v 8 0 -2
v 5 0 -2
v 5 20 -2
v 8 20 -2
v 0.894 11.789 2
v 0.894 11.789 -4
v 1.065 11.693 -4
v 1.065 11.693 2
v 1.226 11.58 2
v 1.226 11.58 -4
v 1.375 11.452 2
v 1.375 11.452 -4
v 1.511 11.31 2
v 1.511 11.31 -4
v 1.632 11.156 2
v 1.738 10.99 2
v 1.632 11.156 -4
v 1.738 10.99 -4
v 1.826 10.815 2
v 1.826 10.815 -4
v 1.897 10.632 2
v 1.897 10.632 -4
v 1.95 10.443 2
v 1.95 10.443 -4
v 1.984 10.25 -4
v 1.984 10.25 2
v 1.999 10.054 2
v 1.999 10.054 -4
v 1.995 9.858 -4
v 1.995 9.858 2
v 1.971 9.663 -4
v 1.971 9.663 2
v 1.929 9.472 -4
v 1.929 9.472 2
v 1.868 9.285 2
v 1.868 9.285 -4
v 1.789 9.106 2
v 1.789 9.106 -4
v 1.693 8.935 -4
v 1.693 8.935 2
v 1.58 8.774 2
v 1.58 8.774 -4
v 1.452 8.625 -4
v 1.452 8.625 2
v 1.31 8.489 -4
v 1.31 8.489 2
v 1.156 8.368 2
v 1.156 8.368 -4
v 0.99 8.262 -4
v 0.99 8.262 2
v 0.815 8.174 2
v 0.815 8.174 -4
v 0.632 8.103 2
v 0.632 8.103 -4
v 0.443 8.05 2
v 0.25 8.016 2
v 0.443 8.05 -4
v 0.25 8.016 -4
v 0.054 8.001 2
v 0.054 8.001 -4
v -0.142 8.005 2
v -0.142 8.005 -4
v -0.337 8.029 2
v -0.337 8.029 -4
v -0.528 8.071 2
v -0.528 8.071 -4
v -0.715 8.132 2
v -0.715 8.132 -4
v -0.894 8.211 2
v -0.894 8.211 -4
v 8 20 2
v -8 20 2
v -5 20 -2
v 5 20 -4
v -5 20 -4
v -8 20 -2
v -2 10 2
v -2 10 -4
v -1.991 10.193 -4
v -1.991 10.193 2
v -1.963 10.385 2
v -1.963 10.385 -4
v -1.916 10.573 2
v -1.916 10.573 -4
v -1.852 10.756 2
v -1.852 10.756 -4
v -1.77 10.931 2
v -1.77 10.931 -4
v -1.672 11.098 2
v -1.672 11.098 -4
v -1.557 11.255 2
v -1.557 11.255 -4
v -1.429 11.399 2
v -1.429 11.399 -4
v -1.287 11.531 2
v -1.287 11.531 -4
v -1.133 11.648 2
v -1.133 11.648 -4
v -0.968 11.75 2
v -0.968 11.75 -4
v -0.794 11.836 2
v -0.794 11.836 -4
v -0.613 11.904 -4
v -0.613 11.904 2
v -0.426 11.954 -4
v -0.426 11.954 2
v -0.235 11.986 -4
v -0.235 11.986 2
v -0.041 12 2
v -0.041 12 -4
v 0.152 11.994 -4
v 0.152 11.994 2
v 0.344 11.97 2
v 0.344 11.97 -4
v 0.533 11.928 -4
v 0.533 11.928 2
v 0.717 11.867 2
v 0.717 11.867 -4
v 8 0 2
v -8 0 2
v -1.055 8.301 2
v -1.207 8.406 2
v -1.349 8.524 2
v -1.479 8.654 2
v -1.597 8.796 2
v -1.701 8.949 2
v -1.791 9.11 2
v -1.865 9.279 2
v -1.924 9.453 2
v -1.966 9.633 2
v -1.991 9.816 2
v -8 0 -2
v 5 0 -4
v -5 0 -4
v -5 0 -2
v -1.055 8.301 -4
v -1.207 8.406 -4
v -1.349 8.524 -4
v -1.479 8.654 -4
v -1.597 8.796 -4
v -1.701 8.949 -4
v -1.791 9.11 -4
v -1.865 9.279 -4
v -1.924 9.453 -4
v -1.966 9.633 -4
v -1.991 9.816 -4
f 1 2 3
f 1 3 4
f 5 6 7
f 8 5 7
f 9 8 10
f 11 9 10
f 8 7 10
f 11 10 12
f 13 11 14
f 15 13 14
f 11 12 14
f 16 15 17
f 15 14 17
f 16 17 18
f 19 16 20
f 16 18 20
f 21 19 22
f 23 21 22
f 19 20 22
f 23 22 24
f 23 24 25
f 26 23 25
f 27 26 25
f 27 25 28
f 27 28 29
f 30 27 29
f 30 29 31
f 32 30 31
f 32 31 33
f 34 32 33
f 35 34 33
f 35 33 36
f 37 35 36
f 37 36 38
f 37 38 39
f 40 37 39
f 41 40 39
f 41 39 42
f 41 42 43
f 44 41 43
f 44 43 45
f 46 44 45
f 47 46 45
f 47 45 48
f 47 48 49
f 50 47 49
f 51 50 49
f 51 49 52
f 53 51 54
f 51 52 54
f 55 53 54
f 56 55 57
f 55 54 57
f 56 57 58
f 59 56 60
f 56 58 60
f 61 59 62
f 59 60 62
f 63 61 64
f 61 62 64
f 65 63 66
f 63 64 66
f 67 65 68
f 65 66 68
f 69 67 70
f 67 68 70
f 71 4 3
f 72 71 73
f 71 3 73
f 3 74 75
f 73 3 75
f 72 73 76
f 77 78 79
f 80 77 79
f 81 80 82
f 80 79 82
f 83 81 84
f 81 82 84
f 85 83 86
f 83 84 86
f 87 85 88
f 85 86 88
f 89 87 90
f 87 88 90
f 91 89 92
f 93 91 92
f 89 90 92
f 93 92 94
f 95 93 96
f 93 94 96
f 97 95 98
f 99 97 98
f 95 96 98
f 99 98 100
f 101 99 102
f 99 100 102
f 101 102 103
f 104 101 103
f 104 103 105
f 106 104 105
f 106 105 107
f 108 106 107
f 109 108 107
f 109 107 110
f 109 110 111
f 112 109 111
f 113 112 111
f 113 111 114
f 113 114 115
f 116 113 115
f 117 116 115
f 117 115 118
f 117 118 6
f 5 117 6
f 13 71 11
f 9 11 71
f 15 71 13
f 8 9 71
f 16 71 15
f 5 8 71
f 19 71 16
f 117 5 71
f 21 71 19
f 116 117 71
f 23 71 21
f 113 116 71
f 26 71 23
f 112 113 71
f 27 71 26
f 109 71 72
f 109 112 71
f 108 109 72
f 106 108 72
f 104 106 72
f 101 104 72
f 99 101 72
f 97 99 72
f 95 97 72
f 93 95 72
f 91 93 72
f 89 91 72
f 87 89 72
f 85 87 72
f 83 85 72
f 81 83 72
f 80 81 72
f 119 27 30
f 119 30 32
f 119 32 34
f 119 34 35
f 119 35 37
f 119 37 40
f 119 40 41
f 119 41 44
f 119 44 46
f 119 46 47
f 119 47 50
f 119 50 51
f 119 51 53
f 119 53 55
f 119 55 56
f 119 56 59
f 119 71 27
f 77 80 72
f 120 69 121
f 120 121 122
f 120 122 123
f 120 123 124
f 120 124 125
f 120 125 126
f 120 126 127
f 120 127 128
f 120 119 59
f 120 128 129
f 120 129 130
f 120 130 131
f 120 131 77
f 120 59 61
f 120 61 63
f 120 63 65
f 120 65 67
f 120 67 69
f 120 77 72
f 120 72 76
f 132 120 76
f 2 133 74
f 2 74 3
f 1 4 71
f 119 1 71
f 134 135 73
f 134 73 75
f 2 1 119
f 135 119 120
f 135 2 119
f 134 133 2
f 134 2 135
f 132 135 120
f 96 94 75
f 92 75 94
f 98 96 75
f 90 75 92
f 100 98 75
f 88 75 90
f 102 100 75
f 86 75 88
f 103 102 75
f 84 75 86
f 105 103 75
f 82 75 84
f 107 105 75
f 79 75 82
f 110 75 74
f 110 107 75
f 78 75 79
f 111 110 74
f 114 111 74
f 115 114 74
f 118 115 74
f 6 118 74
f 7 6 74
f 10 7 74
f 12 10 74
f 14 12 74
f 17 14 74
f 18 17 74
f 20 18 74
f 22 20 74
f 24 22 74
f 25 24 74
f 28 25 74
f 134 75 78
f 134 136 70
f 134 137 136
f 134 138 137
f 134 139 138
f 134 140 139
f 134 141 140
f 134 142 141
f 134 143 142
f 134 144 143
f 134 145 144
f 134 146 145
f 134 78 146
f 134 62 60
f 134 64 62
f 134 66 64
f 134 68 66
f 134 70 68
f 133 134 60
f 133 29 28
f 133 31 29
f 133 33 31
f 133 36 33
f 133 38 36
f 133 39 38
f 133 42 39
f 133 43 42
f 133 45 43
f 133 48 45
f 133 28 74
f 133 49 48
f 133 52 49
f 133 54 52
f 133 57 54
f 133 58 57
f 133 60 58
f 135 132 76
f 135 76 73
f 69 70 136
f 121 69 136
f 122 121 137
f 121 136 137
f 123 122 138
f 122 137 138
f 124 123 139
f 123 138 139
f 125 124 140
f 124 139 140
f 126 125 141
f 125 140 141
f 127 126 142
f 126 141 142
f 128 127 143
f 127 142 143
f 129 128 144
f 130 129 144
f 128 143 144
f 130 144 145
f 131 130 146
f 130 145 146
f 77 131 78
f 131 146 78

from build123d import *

# Parameters (mm, degrees)
EXTRUDE_1_DEPTH     = 20
CUT_EXTRUDE_2_DEPTH = 20


with BuildPart() as part:
    # 草图1 → 凸台-拉伸1 (new body)
    with BuildSketch(Plane(origin=(0, 0, 0), x_dir=(1, 0, 0), z_dir=(0, 1, 0))):
        Polygon((5, 2), (8, 2), (8, -2), (-8, -2), (-8, 2), (-5, 2), (-5, 4), (5, 4), align=None)
    extrude(amount=EXTRUDE_1_DEPTH)

    # 草图4 → 切除-拉伸2 (cut)
    with BuildSketch(Plane(origin=(0, 0, -4), x_dir=(-1, 0, 0), z_dir=(0, 0, -1))):
        with BuildLine():
            ThreePointArc((2, 10), (1.051462224, 11.701301617), (-0.894427191, 11.788854382))
            Line((-0.894427191, 11.788854382), (0.894427191, 8.211145618))
            ThreePointArc((0.894427191, 8.211145618), (1.701301617, 8.948537776), (2, 10))
        make_face()
        with BuildLine():
            Line((0.894427191, 8.211145618), (-0.894427191, 11.788854382))
            ThreePointArc((-0.894427191, 11.788854382), (-1.788854382, 9.105572809), (0.894427191, 8.211145618))
        make_face()
    extrude(amount=-CUT_EXTRUDE_2_DEPTH, mode=Mode.SUBTRACT)


solid = part.part
